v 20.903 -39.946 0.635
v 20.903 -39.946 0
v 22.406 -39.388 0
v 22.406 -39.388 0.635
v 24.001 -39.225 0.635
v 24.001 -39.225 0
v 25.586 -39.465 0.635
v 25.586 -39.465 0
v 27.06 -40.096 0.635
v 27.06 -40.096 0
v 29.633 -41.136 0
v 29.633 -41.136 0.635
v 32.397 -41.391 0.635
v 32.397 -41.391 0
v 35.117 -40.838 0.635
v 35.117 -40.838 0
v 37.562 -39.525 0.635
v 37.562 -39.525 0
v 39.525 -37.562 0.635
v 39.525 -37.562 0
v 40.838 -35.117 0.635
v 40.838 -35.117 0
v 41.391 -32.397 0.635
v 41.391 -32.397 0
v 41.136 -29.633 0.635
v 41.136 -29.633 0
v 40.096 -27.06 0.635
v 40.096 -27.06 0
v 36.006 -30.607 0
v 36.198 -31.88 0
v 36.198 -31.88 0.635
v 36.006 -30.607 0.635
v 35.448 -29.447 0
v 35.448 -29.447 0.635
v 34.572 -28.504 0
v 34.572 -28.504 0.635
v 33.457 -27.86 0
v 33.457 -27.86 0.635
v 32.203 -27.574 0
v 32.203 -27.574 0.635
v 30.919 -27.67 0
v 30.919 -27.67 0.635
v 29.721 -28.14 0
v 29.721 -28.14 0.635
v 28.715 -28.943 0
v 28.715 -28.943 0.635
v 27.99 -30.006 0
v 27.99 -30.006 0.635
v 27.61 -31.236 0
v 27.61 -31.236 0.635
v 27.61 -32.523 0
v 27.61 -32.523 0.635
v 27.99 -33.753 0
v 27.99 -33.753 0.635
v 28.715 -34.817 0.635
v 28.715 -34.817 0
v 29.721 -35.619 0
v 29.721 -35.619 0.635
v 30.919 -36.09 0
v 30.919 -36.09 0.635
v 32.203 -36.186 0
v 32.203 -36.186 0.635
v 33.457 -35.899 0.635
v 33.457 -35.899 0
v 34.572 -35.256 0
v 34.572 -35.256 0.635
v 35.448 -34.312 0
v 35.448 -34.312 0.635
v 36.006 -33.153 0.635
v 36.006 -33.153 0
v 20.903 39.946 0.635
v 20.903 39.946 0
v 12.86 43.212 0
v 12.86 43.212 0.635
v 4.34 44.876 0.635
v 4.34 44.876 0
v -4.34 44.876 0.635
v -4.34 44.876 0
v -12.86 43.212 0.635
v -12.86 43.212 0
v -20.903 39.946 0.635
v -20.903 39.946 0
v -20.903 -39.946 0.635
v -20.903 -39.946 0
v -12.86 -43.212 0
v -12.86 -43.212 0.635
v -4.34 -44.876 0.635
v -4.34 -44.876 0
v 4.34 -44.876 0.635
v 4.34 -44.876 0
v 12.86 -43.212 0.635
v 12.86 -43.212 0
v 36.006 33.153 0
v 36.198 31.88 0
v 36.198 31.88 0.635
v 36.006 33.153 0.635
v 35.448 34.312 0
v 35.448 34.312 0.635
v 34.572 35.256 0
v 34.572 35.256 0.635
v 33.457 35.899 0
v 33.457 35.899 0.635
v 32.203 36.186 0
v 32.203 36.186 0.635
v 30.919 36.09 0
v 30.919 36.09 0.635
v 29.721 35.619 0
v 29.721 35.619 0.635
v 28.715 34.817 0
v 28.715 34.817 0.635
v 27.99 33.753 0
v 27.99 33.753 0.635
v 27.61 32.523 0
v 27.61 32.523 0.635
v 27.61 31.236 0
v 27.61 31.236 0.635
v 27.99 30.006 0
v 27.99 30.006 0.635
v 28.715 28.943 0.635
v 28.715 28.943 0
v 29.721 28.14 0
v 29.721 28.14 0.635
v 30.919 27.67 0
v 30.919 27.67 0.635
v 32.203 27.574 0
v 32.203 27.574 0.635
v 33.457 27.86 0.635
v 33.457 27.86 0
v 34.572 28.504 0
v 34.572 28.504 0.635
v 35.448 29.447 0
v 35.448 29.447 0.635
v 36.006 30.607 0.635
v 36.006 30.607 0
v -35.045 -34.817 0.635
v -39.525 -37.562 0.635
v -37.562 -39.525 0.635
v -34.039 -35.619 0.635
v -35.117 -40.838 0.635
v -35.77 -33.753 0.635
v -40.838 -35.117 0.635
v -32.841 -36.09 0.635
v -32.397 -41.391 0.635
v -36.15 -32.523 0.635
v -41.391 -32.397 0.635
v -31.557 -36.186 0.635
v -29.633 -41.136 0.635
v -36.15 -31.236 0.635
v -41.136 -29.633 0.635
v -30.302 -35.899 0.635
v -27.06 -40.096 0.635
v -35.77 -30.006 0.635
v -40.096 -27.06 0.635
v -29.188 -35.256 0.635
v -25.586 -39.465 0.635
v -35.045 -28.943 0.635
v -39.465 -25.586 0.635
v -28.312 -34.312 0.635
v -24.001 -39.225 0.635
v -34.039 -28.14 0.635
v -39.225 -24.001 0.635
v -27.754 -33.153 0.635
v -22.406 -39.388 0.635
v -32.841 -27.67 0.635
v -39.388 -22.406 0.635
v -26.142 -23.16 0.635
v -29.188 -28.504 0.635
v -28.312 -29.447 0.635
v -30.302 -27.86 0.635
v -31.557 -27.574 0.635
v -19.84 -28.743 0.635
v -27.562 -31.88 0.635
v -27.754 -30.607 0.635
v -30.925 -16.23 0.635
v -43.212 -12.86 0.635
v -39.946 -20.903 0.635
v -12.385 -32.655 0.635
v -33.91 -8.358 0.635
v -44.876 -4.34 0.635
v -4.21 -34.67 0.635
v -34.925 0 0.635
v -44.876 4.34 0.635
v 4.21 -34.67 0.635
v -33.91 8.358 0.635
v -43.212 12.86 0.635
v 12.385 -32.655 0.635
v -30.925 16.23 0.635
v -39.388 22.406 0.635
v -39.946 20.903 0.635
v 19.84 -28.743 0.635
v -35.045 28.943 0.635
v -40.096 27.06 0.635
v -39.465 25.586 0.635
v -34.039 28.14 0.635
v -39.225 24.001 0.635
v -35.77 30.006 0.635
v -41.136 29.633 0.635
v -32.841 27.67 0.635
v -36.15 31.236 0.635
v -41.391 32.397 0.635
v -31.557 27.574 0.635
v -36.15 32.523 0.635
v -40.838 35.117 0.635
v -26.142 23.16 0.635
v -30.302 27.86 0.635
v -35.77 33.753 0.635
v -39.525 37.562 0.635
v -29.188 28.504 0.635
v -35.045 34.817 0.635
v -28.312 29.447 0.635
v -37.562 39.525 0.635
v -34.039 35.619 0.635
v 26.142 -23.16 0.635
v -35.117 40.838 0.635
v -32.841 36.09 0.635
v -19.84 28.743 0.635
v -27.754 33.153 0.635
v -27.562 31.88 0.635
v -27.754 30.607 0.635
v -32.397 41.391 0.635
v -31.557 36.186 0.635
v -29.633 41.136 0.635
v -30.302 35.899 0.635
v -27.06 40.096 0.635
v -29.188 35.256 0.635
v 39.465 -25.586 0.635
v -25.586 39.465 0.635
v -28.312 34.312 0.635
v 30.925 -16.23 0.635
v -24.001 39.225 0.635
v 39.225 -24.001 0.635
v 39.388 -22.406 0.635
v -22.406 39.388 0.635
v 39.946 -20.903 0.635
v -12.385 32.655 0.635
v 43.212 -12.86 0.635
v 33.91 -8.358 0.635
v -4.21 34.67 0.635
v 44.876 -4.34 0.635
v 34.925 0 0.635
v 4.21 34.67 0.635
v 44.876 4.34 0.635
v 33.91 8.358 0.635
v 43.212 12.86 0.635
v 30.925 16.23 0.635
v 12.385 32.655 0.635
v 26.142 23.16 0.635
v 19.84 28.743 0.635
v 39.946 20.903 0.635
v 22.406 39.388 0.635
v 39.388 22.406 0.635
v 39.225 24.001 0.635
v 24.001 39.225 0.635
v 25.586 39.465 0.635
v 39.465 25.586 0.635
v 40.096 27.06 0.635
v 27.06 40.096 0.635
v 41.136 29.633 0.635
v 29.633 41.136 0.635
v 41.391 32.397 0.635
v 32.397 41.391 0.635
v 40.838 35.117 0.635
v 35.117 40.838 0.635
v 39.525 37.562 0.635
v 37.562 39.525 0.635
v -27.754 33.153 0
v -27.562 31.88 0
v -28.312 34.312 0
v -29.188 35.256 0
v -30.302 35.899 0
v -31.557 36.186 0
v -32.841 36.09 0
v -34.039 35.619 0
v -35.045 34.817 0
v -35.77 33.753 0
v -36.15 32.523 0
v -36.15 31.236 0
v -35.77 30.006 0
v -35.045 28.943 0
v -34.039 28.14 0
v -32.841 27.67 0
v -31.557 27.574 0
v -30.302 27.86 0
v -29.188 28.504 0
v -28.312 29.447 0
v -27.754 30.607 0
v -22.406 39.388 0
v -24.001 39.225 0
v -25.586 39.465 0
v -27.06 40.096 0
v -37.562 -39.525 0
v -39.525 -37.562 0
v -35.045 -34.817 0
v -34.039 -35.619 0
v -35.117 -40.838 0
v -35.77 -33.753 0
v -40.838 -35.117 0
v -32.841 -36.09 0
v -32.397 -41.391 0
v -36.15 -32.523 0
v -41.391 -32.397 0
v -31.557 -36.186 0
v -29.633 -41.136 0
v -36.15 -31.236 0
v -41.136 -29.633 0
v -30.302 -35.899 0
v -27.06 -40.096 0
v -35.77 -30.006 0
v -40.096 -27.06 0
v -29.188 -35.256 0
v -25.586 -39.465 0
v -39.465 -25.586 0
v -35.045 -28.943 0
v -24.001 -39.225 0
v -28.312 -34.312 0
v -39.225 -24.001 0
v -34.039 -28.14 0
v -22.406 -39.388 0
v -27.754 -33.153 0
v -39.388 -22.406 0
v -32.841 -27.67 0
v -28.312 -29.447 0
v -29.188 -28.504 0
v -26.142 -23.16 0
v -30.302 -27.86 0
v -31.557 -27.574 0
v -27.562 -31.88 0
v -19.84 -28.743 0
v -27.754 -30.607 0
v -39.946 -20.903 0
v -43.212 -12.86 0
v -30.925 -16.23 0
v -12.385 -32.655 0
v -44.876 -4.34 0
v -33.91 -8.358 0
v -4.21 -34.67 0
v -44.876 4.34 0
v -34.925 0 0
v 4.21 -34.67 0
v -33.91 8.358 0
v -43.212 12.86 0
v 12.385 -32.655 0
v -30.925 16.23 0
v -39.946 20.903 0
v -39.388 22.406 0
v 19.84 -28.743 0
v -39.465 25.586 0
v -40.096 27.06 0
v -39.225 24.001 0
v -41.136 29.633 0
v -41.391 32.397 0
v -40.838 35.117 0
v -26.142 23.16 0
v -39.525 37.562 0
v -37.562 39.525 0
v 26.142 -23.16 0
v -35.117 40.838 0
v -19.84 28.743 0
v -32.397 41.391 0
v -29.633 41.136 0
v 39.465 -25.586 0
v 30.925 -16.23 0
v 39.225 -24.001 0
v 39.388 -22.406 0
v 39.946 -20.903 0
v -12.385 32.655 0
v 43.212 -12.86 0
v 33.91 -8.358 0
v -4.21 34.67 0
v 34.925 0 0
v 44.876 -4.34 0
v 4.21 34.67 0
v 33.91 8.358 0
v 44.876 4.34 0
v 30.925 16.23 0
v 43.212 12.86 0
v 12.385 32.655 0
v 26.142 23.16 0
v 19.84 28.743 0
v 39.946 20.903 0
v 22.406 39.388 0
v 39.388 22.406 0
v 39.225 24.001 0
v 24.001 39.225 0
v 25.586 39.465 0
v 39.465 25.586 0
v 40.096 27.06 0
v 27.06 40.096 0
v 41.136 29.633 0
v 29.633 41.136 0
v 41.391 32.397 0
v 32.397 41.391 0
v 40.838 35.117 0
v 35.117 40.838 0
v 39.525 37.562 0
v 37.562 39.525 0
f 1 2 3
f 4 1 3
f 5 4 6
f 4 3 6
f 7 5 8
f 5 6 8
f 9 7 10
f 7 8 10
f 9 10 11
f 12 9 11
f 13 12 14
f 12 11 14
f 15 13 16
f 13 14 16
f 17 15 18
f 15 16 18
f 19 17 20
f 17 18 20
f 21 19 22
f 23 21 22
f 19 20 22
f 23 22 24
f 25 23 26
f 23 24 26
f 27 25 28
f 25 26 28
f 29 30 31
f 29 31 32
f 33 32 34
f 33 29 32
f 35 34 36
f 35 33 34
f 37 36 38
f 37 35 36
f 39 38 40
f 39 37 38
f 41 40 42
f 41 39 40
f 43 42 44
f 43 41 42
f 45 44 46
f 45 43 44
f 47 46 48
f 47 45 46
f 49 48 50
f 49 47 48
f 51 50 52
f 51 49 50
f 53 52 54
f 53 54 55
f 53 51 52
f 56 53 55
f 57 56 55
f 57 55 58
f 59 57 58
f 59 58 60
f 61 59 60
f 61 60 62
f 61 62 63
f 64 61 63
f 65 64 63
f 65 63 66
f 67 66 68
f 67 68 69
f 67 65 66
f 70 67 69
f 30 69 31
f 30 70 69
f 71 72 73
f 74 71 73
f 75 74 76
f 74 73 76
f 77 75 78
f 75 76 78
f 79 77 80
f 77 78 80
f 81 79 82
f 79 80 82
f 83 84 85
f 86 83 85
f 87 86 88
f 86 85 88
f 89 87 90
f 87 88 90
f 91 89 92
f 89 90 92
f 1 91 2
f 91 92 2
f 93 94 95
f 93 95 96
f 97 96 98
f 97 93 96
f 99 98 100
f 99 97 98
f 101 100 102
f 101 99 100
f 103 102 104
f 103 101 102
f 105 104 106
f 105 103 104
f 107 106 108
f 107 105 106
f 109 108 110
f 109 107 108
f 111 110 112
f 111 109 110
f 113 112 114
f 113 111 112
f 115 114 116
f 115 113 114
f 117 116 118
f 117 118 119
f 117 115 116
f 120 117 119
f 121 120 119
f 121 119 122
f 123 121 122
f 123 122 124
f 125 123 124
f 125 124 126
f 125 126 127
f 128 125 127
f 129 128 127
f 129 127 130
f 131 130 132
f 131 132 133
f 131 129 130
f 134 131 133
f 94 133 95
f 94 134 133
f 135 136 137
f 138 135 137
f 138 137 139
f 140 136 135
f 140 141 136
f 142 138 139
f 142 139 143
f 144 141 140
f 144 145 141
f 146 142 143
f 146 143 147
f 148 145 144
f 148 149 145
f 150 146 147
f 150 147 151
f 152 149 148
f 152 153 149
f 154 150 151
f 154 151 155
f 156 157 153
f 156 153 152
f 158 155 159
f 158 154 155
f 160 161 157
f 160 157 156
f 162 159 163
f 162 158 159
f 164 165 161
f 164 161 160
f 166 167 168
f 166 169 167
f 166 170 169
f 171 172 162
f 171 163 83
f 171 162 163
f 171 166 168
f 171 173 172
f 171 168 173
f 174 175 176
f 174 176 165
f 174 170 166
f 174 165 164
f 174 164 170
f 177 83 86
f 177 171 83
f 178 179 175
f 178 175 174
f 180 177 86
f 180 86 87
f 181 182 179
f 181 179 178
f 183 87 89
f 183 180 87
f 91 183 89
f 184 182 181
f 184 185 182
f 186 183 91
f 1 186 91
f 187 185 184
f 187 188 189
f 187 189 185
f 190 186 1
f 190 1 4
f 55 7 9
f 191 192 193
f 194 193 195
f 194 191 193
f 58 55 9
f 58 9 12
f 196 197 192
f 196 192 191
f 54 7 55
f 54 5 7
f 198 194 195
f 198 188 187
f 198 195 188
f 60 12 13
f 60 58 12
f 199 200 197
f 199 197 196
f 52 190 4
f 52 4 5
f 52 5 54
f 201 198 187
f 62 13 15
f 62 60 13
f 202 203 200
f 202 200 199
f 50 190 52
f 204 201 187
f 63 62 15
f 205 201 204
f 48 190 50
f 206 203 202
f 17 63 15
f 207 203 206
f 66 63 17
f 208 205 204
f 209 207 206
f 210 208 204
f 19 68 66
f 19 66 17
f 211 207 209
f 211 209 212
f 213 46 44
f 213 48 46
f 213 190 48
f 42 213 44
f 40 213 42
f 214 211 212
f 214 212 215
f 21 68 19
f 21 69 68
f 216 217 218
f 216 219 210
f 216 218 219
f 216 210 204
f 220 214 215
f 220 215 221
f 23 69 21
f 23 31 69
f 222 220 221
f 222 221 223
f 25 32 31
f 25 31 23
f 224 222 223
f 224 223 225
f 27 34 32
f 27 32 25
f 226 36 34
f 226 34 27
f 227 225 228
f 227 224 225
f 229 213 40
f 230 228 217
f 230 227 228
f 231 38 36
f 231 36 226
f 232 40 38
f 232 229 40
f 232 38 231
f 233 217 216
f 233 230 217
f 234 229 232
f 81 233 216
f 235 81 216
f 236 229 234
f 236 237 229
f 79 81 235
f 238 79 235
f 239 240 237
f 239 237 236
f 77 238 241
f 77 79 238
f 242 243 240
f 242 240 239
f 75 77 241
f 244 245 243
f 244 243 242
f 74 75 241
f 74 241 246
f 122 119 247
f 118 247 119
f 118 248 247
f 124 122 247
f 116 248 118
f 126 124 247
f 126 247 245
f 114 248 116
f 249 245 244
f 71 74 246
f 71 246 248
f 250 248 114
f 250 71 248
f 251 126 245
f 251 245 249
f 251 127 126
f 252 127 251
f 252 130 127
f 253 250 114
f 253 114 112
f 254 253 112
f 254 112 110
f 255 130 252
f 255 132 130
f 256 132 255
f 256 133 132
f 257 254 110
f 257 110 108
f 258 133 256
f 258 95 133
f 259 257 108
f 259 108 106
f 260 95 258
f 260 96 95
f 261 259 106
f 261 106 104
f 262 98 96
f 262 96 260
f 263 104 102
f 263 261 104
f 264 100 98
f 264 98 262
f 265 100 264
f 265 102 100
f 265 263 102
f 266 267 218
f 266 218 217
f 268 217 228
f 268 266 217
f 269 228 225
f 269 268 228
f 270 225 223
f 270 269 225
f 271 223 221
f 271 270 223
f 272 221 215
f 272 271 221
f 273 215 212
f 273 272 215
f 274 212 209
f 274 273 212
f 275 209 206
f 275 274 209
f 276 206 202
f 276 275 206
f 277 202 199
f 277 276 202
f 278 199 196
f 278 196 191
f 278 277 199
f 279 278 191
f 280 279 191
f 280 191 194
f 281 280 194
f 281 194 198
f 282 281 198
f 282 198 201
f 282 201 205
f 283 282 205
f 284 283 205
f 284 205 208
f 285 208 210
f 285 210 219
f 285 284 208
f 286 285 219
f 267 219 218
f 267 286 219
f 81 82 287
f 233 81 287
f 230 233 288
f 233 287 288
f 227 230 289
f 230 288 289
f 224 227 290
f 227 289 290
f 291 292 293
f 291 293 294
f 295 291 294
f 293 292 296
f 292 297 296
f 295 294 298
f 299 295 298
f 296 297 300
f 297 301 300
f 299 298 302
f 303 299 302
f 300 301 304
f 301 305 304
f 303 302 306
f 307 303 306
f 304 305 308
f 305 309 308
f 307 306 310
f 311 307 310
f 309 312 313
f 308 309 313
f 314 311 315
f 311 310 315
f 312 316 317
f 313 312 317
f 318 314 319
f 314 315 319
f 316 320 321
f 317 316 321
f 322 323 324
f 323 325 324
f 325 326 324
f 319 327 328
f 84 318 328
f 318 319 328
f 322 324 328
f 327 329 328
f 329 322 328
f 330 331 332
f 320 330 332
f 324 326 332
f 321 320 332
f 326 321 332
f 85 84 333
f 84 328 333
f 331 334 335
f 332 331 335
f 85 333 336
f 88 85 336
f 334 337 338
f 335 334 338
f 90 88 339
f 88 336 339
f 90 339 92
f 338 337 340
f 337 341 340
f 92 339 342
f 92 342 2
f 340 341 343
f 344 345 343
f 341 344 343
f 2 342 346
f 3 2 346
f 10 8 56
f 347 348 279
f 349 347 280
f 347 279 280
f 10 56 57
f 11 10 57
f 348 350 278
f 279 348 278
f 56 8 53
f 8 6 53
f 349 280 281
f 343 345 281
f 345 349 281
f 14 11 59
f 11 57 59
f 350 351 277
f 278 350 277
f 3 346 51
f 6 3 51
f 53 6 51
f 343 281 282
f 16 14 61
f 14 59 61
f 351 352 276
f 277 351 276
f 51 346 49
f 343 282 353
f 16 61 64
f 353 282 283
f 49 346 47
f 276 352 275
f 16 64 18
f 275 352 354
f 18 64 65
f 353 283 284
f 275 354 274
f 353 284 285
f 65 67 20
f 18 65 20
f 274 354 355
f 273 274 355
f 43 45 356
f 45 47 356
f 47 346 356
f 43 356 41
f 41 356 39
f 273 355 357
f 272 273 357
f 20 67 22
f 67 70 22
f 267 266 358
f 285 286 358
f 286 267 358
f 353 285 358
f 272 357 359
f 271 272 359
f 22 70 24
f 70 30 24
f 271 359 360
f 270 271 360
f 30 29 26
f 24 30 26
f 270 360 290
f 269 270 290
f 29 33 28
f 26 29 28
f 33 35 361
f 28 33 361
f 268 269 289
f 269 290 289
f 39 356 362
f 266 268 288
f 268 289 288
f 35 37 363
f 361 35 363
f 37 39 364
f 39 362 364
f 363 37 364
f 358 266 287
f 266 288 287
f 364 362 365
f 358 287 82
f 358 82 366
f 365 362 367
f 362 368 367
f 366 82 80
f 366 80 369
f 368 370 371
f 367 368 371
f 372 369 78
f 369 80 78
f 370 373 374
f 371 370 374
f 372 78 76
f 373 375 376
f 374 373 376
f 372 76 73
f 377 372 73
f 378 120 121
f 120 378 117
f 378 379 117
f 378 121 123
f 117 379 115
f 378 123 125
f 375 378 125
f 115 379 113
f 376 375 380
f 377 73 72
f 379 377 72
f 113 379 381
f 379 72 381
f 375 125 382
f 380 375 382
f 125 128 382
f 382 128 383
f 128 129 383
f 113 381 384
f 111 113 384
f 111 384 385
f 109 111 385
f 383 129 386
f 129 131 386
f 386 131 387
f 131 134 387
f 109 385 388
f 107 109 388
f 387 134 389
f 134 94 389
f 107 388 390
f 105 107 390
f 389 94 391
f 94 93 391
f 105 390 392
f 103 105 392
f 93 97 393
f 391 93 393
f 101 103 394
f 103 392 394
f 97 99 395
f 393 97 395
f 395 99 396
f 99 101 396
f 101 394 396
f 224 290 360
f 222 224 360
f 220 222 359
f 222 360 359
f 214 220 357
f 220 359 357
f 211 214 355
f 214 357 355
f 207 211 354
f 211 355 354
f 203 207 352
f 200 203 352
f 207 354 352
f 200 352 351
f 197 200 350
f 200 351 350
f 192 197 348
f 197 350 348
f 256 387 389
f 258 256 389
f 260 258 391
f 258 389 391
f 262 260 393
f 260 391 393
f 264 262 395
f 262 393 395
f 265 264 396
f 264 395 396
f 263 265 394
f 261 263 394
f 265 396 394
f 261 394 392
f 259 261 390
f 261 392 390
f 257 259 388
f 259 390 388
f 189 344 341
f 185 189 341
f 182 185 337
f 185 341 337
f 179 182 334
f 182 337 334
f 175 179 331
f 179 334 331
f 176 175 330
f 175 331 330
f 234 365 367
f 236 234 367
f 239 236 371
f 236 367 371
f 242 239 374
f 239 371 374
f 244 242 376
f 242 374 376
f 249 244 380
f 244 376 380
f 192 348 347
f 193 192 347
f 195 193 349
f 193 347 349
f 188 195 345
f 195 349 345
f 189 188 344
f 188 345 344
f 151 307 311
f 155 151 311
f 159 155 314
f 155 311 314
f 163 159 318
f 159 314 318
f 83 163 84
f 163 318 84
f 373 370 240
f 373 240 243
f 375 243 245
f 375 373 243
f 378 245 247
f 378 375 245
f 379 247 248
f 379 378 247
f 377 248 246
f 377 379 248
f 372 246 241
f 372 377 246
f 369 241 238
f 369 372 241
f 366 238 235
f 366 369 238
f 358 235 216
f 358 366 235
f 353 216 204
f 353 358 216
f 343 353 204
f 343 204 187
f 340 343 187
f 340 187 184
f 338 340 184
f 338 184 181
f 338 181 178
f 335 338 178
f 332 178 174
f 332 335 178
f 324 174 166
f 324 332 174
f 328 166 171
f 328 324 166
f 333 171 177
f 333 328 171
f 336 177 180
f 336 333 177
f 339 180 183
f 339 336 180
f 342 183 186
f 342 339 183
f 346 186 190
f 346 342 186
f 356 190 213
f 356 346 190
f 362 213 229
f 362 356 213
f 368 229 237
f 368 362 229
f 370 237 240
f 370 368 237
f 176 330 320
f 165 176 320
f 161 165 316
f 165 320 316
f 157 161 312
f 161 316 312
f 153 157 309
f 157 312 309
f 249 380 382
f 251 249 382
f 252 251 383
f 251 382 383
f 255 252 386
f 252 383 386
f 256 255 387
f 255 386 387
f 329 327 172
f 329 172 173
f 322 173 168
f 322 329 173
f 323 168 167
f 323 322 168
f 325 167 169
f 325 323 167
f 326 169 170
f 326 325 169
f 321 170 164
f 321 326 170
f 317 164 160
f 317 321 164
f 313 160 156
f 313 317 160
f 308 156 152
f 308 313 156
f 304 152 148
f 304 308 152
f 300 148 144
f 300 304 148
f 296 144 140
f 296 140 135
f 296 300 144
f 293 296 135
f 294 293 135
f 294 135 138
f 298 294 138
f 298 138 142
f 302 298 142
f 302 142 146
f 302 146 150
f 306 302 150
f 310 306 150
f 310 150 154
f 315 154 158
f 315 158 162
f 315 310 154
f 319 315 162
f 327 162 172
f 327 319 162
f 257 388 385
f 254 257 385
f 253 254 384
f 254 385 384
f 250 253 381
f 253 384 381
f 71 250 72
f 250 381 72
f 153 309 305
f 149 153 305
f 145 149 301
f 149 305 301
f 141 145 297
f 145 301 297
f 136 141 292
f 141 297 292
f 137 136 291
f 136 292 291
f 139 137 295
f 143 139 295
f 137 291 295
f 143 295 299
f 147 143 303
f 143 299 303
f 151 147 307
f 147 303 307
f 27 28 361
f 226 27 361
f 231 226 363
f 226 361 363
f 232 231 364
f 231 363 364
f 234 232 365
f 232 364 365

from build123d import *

# Parameters (mm, degrees)
SKETCH1_R           = 34.925
SKETCH1_R_2         = 4.318
BOSS_EXTRUDE1_DEPTH = 0.635


with BuildPart() as part:
    # Sketch1 → Boss-Extrude1 (new body)
    with BuildSketch(Plane.XY):
        with BuildLine():
            ThreePointArc((20.903132924, 39.946417348), (0, 45.085), (-20.903132924, 39.946417348))
            ThreePointArc((-20.903132924, 39.946417348), (-24.001012396, 39.224535565), (-27.060305383, 40.09556768))
            ThreePointArc((-27.060305383, 40.09556768), (-38.615101321, 38.615101321), (-40.09556768, 27.060305383))
            ThreePointArc((-40.09556768, 27.060305383), (-39.224535565, 24.001012396), (-39.946417348, 20.903132924))
            ThreePointArc((-39.946417348, 20.903132924), (-45.085, 0), (-39.946417348, -20.903132924))
            ThreePointArc((-39.946417348, -20.903132924), (-39.224535565, -24.001012396), (-40.09556768, -27.060305383))
            ThreePointArc((-40.09556768, -27.060305383), (-38.615101321, -38.615101321), (-27.060305383, -40.09556768))
            ThreePointArc((-27.060305383, -40.09556768), (-24.001012396, -39.224535565), (-20.903132924, -39.946417348))
            ThreePointArc((-20.903132924, -39.946417348), (0, -45.085), (20.903132924, -39.946417348))
            ThreePointArc((20.903132924, -39.946417348), (24.001012396, -39.224535565), (27.060305383, -40.09556768))
            ThreePointArc((27.060305383, -40.09556768), (38.615101321, -38.615101321), (40.09556768, -27.060305383))
            ThreePointArc((40.09556768, -27.060305383), (39.224535565, -24.001012396), (39.946417348, -20.903132924))
            ThreePointArc((39.946417348, -20.903132924), (45.085, 0), (39.946417348, 20.903132924))
            ThreePointArc((39.946417348, 20.903132924), (39.224535565, 24.001012396), (40.09556768, 27.060305383))
            ThreePointArc((40.09556768, 27.060305383), (38.615101321, 38.615101321), (27.060305383, 40.09556768))
            ThreePointArc((27.060305383, 40.09556768), (24.001012396, 39.224535565), (20.903132924, 39.946417348))
        make_face()
        Circle(SKETCH1_R, mode=Mode.SUBTRACT)
        with Locations((31.87990923, 31.87990923)):
            Circle(SKETCH1_R_2, mode=Mode.SUBTRACT)
        with Locations((31.87990923, -31.87990923)):
            Circle(SKETCH1_R_2, mode=Mode.SUBTRACT)
        with Locations((-31.87990923, -31.87990923)):
            Circle(SKETCH1_R_2, mode=Mode.SUBTRACT)
        with Locations((-31.87990923, 31.87990923)):
            Circle(SKETCH1_R_2, mode=Mode.SUBTRACT)
    extrude(amount=BOSS_EXTRUDE1_DEPTH)


solid = part.part
